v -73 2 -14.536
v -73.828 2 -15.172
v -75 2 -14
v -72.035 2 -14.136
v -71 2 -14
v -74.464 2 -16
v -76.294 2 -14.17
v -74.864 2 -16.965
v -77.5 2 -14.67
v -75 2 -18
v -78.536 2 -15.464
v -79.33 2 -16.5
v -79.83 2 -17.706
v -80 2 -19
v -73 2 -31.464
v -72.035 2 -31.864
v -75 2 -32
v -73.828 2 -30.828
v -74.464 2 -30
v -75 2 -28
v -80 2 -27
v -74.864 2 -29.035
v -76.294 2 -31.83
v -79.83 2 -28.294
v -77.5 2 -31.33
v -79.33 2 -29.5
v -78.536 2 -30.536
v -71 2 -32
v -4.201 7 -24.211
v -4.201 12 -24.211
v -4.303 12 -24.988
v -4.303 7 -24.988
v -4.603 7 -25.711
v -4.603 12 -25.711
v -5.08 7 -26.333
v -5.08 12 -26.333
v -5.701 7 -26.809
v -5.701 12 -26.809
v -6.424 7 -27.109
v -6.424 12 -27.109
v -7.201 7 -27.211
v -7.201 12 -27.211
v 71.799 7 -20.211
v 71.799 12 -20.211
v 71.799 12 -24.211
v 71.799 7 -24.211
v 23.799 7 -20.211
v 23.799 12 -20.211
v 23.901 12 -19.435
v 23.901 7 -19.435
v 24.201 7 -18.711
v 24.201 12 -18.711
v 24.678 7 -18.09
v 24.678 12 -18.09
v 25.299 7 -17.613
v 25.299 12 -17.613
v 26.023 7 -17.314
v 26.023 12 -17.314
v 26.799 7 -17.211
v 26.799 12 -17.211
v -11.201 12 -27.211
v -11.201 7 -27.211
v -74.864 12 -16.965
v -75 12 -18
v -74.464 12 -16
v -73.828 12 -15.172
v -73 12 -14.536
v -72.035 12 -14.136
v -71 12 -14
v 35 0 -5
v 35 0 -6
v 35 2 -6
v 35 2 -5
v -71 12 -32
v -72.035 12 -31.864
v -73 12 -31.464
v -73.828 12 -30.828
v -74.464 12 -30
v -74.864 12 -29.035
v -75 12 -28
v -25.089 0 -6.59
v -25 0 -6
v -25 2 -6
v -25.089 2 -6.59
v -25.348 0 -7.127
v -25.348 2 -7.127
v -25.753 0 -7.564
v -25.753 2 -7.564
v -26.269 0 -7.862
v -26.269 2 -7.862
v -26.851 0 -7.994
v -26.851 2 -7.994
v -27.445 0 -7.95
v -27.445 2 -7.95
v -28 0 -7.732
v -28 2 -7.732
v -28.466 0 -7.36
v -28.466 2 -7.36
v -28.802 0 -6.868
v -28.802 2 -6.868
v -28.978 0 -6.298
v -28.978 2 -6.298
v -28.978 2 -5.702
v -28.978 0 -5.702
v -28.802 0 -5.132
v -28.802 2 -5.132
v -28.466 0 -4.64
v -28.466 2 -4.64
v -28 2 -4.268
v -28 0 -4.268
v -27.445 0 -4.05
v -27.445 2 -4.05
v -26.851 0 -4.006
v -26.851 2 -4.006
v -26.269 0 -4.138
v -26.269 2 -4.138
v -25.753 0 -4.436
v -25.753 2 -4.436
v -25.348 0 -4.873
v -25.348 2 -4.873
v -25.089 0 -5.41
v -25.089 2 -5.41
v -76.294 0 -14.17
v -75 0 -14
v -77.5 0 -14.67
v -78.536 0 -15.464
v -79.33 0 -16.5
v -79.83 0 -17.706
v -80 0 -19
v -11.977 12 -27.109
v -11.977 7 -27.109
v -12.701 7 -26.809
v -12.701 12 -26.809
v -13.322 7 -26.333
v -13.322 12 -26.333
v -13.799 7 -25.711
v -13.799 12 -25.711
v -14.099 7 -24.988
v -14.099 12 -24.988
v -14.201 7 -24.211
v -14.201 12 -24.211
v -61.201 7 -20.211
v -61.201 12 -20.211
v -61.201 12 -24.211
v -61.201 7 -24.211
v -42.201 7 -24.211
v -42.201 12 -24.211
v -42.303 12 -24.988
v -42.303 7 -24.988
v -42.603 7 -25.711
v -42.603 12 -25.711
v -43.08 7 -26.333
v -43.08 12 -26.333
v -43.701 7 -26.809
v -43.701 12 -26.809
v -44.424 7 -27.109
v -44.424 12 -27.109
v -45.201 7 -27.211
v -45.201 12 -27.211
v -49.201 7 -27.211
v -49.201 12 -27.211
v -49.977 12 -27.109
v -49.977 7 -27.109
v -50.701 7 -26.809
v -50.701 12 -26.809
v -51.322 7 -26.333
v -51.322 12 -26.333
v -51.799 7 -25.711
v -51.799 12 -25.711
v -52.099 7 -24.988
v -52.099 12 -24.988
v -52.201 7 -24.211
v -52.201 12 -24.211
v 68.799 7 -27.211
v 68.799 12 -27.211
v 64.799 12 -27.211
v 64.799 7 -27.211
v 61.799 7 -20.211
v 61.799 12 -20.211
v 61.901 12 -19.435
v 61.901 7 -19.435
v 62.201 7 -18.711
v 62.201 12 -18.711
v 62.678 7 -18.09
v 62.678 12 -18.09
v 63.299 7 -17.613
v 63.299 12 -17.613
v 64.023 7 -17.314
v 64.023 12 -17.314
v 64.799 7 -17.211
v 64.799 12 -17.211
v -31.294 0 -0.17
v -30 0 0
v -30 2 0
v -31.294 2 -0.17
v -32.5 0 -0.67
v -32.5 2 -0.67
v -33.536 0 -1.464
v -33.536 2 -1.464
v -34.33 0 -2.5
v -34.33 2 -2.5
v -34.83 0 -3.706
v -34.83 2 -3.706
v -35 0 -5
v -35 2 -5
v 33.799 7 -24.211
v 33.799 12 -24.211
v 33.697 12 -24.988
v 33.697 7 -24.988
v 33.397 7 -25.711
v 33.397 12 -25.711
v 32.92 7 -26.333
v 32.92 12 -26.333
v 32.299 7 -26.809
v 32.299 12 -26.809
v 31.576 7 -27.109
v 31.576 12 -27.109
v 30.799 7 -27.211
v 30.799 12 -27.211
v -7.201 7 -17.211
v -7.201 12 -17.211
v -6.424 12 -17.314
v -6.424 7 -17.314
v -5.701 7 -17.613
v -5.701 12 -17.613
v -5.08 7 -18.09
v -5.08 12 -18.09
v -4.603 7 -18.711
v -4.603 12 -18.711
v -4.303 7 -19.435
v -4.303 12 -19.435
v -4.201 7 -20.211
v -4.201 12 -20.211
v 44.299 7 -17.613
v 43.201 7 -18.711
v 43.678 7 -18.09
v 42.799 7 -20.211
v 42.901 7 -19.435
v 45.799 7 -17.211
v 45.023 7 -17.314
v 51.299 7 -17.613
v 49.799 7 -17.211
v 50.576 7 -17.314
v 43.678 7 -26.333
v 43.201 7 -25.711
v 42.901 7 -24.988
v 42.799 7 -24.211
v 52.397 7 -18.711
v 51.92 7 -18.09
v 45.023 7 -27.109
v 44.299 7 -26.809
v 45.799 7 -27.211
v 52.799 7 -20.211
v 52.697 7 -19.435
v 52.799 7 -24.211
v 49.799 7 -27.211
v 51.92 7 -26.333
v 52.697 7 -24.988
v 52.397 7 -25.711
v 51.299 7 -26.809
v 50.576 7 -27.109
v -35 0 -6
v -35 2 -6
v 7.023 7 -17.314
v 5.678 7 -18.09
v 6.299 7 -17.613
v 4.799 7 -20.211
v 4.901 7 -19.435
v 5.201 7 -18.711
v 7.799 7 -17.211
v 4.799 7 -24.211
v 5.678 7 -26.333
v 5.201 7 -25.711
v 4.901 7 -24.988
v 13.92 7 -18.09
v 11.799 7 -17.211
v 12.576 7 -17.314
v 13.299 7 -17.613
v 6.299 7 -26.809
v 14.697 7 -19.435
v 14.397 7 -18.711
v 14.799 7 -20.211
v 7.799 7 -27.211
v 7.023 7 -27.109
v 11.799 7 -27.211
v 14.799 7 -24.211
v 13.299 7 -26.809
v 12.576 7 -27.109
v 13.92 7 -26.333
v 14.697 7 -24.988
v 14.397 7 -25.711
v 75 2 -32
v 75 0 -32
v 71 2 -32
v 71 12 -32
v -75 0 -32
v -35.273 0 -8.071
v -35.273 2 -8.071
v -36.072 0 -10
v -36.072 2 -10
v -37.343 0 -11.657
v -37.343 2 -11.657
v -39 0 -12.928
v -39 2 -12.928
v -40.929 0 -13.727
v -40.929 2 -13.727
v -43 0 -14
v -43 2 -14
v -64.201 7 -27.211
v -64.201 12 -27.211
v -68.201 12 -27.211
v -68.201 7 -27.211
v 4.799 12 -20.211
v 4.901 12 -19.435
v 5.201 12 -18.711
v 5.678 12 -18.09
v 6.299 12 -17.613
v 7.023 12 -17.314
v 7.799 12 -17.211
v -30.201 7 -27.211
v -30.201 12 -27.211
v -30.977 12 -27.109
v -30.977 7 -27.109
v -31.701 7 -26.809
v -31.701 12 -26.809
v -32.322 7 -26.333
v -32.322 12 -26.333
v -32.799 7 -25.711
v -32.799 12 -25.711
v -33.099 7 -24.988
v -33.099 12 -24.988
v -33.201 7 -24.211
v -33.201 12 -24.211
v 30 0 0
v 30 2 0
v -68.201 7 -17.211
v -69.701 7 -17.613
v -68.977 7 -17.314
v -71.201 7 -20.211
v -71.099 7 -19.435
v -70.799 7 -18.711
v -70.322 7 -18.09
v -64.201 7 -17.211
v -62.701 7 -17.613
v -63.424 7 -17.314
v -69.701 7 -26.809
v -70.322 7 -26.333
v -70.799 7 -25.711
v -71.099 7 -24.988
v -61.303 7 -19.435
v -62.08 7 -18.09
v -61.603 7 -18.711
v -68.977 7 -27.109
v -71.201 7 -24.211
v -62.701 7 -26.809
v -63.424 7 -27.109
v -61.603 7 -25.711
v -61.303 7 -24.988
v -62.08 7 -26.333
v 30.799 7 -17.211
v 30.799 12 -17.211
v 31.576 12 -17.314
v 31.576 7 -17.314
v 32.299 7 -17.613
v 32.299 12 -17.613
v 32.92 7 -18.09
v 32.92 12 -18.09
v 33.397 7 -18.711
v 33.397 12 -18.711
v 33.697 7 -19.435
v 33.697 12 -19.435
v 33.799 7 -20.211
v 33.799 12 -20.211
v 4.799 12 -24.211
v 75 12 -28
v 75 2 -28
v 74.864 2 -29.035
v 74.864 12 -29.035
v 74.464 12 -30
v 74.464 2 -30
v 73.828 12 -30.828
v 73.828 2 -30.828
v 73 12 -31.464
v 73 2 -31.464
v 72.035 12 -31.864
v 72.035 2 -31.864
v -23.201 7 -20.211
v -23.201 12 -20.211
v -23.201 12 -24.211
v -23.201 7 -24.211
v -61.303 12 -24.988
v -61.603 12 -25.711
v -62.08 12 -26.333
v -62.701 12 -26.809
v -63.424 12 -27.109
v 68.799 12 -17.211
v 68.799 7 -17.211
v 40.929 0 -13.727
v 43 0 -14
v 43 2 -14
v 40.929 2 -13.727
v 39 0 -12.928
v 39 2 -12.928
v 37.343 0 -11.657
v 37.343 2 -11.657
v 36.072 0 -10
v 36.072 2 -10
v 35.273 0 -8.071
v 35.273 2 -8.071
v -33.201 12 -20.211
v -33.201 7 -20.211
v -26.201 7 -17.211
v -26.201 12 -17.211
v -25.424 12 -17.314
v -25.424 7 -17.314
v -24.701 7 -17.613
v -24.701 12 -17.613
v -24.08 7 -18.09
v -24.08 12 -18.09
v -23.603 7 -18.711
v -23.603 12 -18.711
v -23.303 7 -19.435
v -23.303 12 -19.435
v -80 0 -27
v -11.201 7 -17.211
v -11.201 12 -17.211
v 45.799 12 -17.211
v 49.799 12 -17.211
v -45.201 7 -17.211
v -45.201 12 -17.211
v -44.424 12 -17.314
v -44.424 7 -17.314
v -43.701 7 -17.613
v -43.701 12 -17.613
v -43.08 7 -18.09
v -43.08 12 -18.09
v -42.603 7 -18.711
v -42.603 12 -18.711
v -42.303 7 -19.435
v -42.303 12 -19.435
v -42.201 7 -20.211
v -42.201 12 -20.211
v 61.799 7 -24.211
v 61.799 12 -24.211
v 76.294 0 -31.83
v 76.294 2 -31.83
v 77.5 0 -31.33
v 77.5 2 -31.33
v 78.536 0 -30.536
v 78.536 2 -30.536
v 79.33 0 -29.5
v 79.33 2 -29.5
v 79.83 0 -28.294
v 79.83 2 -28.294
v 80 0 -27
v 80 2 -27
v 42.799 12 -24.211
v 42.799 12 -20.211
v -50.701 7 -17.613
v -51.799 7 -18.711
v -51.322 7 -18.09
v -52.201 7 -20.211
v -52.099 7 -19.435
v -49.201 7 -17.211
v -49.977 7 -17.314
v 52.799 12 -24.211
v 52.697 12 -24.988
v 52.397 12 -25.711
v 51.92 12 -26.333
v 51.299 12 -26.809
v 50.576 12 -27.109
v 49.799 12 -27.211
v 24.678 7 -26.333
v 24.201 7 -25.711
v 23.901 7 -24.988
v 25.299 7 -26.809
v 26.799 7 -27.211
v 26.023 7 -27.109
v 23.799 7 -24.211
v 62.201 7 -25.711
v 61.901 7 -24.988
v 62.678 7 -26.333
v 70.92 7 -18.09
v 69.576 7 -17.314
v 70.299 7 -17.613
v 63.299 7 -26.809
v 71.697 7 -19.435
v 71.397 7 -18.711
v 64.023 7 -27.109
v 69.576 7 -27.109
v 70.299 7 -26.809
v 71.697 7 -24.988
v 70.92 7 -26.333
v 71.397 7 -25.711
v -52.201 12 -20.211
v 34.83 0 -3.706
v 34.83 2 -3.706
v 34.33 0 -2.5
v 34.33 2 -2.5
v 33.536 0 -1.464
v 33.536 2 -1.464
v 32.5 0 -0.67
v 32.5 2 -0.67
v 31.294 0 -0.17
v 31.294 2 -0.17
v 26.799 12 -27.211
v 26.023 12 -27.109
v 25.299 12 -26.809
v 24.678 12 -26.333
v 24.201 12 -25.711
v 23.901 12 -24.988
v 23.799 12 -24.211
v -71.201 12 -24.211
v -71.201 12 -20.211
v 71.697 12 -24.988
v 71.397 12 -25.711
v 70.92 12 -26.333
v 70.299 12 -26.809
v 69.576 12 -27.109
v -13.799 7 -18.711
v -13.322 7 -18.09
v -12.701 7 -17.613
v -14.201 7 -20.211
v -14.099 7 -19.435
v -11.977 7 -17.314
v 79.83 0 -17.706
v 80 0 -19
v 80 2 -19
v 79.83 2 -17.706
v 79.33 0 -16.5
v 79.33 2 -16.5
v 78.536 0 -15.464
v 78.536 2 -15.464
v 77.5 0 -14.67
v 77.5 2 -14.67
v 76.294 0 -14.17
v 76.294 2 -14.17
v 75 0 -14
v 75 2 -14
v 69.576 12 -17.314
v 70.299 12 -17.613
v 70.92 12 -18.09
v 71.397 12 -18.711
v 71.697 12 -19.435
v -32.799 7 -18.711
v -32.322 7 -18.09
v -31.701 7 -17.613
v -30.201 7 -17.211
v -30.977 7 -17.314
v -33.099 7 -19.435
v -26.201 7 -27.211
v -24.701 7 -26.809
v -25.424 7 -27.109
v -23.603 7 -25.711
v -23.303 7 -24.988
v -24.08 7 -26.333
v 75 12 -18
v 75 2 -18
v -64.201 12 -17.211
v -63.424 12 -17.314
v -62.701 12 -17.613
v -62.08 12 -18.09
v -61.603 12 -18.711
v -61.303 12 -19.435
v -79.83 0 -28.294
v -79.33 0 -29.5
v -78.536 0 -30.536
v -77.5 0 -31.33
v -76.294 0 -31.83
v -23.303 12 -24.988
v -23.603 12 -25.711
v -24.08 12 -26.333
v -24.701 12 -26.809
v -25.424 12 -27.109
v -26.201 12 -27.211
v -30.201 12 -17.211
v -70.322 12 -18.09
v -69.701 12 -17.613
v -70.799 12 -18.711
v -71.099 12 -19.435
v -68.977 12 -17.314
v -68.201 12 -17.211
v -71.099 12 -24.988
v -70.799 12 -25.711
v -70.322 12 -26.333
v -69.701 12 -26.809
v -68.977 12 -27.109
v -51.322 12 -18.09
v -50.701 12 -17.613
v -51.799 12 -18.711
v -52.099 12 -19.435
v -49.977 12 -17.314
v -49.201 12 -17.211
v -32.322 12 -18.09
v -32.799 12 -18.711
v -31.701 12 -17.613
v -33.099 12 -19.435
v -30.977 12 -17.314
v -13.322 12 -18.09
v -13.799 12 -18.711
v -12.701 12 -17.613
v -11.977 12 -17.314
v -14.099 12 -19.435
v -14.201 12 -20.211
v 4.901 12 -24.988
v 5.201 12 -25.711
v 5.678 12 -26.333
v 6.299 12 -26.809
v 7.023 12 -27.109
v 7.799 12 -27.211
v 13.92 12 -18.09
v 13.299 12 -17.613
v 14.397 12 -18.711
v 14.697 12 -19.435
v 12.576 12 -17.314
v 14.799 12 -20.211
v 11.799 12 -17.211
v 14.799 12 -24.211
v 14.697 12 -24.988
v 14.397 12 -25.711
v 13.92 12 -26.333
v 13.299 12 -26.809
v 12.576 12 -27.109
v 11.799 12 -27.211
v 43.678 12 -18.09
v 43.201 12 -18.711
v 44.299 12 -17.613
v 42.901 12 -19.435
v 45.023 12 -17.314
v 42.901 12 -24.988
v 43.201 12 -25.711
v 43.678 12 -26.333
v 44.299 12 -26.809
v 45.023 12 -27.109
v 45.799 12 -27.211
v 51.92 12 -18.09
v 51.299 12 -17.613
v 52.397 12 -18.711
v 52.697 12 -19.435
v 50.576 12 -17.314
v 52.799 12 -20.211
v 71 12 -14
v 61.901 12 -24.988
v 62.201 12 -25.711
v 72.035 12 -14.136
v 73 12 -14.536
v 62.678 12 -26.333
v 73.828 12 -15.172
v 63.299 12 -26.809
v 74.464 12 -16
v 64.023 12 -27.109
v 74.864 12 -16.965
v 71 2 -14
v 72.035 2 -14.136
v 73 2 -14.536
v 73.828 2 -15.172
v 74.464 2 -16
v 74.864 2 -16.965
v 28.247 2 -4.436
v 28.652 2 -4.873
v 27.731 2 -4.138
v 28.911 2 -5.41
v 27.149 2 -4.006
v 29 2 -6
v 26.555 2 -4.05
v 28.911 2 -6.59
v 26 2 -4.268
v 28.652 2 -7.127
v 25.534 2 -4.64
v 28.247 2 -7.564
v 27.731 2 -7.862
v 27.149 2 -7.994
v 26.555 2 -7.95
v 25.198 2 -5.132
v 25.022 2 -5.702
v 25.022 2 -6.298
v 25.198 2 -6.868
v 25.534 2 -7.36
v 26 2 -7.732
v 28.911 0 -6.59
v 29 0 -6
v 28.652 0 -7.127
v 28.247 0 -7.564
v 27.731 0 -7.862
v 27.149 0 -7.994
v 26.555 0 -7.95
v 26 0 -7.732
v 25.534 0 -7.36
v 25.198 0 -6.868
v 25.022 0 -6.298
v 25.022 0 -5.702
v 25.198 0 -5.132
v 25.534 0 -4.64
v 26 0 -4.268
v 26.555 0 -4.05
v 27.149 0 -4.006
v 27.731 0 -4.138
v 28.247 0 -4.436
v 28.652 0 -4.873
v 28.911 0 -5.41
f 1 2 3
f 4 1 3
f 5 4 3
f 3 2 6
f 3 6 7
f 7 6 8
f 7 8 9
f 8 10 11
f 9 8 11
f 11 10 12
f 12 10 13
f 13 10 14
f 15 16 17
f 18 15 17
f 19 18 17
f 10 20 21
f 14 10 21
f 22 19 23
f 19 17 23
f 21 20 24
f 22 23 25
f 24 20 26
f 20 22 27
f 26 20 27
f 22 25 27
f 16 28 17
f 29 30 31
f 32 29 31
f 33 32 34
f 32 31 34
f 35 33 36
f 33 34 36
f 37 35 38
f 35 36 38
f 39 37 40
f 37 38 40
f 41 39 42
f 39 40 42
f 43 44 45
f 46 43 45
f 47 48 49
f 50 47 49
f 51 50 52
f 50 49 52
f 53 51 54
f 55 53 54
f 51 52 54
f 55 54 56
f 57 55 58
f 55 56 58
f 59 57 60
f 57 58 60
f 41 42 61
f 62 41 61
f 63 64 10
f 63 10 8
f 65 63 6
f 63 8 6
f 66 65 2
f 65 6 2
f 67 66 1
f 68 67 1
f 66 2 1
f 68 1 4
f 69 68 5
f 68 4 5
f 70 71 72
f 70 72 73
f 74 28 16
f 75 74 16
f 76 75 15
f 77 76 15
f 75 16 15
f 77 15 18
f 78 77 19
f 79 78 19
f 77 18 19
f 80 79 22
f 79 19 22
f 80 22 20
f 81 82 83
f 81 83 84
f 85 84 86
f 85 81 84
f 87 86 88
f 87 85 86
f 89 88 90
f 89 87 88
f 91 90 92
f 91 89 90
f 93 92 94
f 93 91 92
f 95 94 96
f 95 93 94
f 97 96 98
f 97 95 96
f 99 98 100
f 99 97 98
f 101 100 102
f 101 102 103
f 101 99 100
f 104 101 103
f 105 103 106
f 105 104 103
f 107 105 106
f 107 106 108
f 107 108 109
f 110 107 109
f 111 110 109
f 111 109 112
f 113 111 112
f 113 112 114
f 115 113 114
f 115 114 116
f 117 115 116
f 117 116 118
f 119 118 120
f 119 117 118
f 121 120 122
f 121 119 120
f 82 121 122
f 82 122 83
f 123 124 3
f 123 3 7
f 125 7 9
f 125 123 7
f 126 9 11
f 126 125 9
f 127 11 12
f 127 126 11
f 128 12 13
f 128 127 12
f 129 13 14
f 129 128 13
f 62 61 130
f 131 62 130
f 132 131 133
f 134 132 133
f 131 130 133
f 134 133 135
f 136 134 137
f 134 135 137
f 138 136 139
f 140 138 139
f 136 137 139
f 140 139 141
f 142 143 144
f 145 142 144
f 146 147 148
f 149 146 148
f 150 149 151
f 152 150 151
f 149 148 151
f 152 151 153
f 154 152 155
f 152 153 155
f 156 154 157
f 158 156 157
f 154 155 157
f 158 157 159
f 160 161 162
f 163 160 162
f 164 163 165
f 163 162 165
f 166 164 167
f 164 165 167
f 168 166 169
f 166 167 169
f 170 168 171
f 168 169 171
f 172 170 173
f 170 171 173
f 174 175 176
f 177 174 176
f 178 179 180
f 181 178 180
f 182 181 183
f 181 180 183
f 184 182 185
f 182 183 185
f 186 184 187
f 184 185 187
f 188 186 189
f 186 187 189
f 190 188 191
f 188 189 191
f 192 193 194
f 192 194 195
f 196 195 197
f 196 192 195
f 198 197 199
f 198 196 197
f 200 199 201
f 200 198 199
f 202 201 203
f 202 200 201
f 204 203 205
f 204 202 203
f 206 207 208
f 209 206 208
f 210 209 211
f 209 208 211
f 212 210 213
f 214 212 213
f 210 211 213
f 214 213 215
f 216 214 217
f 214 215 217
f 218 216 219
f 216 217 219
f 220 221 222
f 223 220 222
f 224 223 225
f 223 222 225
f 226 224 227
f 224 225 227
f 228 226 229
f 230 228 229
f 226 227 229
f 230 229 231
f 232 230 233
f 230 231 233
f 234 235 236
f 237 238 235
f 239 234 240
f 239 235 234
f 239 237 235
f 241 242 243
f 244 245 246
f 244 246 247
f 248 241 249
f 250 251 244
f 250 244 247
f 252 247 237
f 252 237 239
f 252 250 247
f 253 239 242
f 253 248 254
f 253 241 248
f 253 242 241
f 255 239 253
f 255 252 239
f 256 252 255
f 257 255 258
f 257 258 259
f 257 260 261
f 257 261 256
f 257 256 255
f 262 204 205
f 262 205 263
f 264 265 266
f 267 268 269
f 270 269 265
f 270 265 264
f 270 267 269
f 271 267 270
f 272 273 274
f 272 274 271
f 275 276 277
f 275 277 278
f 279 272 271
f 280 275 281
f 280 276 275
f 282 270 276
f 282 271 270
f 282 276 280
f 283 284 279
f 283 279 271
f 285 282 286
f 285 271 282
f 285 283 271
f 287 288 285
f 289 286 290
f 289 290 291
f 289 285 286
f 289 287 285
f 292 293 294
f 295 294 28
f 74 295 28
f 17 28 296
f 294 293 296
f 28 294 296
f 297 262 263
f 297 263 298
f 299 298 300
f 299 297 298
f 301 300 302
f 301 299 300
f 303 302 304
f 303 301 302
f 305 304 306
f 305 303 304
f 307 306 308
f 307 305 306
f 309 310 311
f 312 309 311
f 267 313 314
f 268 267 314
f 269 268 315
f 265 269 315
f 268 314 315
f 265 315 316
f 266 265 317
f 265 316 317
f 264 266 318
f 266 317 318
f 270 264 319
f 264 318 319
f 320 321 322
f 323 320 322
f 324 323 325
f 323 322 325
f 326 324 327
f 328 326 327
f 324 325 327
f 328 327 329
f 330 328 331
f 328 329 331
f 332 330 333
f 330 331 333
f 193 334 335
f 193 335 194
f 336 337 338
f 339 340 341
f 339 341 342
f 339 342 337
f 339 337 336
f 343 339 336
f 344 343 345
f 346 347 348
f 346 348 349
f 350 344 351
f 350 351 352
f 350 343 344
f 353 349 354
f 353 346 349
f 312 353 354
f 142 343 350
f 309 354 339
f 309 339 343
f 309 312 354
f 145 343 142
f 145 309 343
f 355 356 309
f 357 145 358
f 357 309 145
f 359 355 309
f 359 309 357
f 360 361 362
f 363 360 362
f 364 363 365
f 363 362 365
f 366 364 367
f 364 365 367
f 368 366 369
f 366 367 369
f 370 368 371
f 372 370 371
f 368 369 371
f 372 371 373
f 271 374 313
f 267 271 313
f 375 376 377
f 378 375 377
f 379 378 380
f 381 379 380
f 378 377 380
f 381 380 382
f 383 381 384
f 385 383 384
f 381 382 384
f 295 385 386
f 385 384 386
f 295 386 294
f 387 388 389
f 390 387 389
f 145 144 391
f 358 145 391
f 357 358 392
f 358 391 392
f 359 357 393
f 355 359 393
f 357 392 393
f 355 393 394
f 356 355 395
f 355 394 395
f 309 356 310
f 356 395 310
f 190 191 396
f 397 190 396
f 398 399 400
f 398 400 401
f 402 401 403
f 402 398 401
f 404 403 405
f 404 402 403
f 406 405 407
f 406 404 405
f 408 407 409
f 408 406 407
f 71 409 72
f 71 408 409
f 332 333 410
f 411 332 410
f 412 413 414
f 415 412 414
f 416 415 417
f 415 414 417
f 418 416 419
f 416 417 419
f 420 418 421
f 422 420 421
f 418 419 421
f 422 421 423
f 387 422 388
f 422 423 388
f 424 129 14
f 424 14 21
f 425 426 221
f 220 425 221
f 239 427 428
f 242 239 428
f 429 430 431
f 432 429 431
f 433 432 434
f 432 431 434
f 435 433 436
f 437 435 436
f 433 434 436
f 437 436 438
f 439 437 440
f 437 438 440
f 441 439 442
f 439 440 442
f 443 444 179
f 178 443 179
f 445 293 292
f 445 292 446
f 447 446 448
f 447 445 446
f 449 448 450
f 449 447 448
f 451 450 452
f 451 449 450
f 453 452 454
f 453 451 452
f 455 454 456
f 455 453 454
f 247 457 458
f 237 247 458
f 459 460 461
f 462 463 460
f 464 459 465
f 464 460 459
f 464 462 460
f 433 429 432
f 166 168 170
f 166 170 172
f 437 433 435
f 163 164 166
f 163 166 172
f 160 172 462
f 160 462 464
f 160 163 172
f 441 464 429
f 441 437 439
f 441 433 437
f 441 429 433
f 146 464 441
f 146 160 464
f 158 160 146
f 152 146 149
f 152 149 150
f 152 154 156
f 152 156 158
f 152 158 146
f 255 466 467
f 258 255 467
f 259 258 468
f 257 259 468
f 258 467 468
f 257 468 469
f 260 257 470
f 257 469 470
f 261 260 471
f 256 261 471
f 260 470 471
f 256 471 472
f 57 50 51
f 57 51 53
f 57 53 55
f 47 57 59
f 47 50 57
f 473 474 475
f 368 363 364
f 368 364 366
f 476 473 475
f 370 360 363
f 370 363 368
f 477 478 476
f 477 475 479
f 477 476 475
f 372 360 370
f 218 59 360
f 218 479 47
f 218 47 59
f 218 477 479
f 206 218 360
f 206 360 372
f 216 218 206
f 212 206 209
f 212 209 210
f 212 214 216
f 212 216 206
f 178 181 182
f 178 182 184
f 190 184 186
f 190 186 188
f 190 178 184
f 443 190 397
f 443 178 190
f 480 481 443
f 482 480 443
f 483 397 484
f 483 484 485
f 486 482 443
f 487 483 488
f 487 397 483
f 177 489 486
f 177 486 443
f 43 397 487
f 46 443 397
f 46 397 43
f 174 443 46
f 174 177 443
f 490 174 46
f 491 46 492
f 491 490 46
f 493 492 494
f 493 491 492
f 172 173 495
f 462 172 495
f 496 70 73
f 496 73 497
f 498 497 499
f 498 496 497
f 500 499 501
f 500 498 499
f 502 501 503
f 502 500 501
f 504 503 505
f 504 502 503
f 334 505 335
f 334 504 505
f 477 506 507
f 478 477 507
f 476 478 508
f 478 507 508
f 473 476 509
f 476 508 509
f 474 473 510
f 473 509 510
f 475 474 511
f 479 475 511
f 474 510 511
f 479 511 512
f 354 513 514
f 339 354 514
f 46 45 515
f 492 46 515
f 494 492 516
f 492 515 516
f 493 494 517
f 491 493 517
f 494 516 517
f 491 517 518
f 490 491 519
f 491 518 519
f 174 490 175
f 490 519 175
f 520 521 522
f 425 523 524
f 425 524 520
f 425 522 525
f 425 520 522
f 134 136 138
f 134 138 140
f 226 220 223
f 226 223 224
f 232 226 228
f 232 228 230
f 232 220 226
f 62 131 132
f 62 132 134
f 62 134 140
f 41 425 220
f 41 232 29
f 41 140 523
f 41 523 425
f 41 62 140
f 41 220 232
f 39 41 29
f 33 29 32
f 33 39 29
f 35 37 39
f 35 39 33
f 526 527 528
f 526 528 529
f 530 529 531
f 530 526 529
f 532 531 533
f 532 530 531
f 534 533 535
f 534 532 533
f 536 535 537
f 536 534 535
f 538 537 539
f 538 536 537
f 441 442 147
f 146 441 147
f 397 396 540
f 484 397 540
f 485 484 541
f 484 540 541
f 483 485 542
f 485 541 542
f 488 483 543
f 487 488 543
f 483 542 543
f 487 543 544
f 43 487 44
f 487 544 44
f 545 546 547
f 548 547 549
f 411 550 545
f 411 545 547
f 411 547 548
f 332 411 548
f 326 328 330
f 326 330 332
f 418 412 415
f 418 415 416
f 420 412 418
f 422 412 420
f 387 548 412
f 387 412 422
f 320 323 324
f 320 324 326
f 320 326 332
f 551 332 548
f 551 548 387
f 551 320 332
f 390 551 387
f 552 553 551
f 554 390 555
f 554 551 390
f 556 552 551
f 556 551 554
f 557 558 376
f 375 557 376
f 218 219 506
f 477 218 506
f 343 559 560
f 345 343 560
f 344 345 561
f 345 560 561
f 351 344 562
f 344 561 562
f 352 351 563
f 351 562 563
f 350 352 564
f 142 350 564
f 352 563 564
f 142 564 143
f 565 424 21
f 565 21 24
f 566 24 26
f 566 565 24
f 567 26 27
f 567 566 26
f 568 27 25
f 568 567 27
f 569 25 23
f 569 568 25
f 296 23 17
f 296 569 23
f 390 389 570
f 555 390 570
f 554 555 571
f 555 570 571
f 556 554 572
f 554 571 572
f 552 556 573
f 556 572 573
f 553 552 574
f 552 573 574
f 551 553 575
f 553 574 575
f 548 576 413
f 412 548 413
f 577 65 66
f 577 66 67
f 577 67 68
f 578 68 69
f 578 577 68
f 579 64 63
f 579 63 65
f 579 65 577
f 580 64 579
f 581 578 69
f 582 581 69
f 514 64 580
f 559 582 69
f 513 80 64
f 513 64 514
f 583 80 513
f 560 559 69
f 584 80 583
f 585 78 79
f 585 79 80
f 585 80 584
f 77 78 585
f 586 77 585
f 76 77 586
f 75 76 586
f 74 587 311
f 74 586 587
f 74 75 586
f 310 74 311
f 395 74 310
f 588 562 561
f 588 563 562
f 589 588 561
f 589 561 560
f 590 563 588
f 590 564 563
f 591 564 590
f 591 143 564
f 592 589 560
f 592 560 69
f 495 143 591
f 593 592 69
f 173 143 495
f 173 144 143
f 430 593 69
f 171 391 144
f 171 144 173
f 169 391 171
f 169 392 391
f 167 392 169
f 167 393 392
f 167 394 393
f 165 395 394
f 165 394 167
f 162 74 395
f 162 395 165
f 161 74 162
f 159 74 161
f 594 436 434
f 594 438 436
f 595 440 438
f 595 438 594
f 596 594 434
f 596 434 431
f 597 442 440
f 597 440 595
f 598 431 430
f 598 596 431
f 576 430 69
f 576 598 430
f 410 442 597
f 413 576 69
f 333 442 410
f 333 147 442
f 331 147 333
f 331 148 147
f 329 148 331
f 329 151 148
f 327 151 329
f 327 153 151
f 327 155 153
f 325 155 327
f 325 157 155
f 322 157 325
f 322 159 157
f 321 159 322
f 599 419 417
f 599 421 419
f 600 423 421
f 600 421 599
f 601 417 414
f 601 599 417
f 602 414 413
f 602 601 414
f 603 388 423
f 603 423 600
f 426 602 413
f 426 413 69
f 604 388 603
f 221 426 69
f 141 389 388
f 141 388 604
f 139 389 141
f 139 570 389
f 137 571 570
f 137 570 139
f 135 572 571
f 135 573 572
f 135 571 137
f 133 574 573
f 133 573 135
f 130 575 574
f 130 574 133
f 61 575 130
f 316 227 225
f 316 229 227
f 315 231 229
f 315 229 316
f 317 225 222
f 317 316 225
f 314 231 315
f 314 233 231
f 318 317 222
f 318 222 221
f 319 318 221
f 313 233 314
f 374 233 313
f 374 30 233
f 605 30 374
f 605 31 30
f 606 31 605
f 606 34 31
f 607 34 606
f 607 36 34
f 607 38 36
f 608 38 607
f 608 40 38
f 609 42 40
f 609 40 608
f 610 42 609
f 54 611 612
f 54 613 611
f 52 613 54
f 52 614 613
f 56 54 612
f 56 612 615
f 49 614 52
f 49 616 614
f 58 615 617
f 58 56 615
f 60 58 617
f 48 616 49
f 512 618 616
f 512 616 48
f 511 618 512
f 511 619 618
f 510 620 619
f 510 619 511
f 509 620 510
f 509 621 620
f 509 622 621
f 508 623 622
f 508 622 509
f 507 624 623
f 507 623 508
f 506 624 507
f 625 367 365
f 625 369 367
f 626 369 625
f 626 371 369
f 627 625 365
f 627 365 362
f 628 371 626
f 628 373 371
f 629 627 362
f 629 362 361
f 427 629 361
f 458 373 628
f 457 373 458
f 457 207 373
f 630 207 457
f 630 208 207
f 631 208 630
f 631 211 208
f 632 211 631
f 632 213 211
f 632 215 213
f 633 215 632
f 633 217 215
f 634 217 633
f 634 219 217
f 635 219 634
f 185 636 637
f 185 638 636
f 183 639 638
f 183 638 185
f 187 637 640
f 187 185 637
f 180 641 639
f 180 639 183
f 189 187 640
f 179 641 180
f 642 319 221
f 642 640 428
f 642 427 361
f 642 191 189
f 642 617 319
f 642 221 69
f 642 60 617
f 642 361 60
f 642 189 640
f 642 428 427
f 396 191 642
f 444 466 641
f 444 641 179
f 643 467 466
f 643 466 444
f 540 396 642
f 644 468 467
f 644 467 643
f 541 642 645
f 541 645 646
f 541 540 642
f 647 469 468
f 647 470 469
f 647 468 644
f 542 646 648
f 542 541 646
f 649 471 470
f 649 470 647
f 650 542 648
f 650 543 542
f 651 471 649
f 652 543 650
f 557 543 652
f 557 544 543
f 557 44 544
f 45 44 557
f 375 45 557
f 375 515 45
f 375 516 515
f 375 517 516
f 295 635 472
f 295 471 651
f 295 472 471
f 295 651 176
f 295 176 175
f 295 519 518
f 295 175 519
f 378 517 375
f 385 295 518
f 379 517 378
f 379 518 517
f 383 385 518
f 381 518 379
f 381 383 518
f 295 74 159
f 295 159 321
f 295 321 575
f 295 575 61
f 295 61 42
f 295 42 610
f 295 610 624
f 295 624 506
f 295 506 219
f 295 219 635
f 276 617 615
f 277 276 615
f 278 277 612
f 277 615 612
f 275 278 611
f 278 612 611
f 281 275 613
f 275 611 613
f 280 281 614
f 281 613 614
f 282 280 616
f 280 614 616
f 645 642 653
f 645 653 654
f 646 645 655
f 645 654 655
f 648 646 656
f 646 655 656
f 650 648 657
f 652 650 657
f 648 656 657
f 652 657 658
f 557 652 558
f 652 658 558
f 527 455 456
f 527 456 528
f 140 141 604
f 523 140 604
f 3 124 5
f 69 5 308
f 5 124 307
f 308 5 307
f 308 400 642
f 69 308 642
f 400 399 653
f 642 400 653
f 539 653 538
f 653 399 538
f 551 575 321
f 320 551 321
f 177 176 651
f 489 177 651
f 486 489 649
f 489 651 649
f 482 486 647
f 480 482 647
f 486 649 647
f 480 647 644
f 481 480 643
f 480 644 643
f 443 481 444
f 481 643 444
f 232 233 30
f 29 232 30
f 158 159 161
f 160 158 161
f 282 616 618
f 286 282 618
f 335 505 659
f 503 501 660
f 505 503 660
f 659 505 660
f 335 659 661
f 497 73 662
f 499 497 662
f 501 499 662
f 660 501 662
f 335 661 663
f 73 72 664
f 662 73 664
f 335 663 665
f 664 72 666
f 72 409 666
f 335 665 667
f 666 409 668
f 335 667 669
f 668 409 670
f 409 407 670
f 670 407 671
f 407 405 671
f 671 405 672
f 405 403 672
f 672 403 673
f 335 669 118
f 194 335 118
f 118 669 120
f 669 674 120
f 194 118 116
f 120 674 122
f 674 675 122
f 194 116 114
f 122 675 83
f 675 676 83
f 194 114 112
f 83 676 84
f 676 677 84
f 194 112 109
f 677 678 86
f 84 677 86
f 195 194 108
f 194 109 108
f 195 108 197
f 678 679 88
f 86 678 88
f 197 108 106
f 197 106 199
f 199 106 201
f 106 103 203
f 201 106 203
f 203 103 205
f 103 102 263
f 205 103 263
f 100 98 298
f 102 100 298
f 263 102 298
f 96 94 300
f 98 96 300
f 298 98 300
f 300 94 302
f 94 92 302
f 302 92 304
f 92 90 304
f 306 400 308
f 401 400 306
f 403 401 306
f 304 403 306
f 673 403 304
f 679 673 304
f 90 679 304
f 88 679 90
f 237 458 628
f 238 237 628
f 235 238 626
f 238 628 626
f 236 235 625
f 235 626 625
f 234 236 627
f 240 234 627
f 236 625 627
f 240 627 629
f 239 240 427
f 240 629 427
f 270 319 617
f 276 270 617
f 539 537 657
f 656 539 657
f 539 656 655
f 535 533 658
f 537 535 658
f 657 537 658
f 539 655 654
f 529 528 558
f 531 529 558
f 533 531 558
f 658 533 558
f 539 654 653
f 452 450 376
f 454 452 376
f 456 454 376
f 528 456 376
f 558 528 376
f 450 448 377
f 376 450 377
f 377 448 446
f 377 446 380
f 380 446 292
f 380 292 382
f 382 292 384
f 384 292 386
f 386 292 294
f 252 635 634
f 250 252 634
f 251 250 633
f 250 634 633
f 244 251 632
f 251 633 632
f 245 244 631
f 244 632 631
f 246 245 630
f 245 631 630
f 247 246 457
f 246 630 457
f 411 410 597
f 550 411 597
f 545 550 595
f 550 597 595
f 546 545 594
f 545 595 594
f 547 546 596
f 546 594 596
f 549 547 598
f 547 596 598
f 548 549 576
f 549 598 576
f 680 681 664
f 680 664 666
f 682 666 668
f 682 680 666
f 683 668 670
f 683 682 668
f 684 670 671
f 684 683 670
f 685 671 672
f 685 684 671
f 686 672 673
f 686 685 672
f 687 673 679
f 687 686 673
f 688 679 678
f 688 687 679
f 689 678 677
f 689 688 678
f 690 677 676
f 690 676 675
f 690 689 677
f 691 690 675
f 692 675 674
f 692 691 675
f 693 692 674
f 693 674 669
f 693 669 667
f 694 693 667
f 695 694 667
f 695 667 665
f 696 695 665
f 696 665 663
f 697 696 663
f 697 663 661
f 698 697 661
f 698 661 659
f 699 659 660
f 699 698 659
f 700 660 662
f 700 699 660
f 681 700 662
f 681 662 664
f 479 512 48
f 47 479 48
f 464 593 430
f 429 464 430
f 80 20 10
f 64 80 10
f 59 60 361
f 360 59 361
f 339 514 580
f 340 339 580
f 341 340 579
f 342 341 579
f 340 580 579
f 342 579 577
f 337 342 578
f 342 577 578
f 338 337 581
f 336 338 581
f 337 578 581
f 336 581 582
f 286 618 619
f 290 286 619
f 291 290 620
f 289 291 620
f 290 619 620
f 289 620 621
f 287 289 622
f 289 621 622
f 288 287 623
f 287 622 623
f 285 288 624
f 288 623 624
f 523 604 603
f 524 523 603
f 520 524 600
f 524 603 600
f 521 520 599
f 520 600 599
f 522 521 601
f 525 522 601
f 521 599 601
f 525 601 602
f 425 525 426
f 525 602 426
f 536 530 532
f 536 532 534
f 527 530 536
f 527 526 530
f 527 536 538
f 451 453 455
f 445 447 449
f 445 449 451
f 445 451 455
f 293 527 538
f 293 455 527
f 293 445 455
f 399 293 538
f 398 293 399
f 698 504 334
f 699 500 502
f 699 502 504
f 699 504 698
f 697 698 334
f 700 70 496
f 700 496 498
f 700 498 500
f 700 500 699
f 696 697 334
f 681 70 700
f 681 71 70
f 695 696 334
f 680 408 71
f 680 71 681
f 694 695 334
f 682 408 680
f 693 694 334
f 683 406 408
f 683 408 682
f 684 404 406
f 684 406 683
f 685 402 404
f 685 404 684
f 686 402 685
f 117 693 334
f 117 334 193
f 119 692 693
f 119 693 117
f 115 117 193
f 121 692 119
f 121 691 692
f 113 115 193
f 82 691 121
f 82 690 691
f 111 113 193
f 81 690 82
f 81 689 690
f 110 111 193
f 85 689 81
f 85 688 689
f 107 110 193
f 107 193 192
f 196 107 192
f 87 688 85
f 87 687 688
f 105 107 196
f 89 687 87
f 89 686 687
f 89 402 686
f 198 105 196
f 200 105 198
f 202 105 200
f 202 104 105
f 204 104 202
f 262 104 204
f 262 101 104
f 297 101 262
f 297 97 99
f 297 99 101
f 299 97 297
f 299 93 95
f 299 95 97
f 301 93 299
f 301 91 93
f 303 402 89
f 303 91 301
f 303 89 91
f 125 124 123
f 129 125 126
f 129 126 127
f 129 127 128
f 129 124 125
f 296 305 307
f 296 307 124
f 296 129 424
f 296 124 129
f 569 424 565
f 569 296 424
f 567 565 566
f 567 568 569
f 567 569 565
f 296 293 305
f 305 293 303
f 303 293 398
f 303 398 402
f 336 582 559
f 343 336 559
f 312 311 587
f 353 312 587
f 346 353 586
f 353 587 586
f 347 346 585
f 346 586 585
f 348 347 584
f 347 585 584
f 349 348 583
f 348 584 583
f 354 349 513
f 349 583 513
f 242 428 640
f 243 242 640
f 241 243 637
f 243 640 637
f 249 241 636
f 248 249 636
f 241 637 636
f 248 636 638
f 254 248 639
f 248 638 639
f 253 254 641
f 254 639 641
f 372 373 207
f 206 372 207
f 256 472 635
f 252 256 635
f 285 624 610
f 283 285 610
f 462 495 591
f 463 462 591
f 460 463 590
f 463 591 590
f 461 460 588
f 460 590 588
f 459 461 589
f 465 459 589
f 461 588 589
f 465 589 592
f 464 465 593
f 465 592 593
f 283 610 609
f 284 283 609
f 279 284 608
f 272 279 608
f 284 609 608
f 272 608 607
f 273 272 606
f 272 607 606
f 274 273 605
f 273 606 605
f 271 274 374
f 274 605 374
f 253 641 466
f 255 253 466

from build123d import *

# Parameters (mm, degrees)
SKETCH_1_R          = 2
EXTRUDE_1_DEPTH     = 2
EXTRUDE_2_DEPTH     = 10
CUT_EXTRUDE_1_DEPTH = 5


with BuildPart() as part:
    # 草图1 → 凸台-拉伸1 (new body)
    with BuildSketch(Plane(origin=(0, 0, 0), x_dir=(1, 0, 0), z_dir=(0, 1, 0))):
        with BuildLine():
            Line((-75, 32), (75, 32))
            ThreePointArc((75, 32), (78.535533906, 30.535533906), (80, 27))
            Line((80, 27), (80, 19))
            ThreePointArc((80, 19), (78.535533906, 15.464466094), (75, 14))
            Line((75, 14), (43, 14))
            ThreePointArc((43, 14), (37.343145751, 11.656854249), (35, 6))
            Line((35, 6), (35, 5))
            ThreePointArc((35, 5), (33.535533906, 1.464466094), (30, 0))
            Line((30, 0), (-30, 0))
            ThreePointArc((-30, 0), (-33.535533906, 1.464466094), (-35, 5))
            Line((-35, 5), (-35, 6))
            ThreePointArc((-35, 6), (-37.343145751, 11.656854249), (-43, 14))
            Line((-43, 14), (-75, 14))
            ThreePointArc((-75, 14), (-78.535533906, 15.464466094), (-80, 19))
            Line((-80, 19), (-80, 27))
            ThreePointArc((-80, 27), (-78.535533906, 30.535533906), (-75, 32))
        make_face()
        with Locations((-27, 6)):
            Circle(SKETCH_1_R, mode=Mode.SUBTRACT)
        with Locations((27, 6)):
            Circle(SKETCH_1_R, mode=Mode.SUBTRACT)
    extrude(amount=EXTRUDE_1_DEPTH)

    # 草图2 → 凸台-拉伸2 (add)
    with BuildSketch(Plane(origin=(0, 2, 0), x_dir=(1, 0, 0), z_dir=(0, 1, 0))):
        with BuildLine():
            Line((-71, 14), (71, 14))
            ThreePointArc((71, 14), (73.828427125, 15.171572875), (75, 18))
            Line((75, 18), (75, 28))
            ThreePointArc((75, 28), (73.828427125, 30.828427125), (71, 32))
            Line((71, 32), (-71, 32))
            ThreePointArc((-71, 32), (-73.828427125, 30.828427125), (-75, 28))
            Line((-75, 28), (-75, 18))
            ThreePointArc((-75, 18), (-73.828427125, 15.171572875), (-71, 14))
        make_face()
    extrude(amount=EXTRUDE_2_DEPTH)

    # 草图3 → 切除-拉伸1 (cut)
    with BuildSketch(Plane(origin=(0, 12, 0), x_dir=(1, 0, 0), z_dir=(0, 1, 0))):
        with BuildLine():
            Line((-49.200934141, 17.21130212), (-45.200934141, 17.21130212))
            ThreePointArc((-45.200934141, 17.21130212), (-43.079613798, 18.089981777), (-42.200934141, 20.21130212))
            Line((-42.200934141, 20.21130212), (-42.200934141, 24.21130212))
            ThreePointArc((-42.200934141, 24.21130212), (-43.079613798, 26.332622464), (-45.200934141, 27.21130212))
            Line((-45.200934141, 27.21130212), (-49.200934141, 27.21130212))
            ThreePointArc((-49.200934141, 27.21130212), (-51.322254485, 26.332622464), (-52.200934141, 24.21130212))
            Line((-52.200934141, 24.21130212), (-52.200934141, 20.21130212))
            ThreePointArc((-52.200934141, 20.21130212), (-51.322254485, 18.089981777), (-49.200934141, 17.21130212))
        make_face()
        with BuildLine():
            Line((-68.200934141, 17.21130212), (-64.200934141, 17.21130212))
            ThreePointArc((-64.200934141, 17.21130212), (-62.079613798, 18.089981777), (-61.200934141, 20.21130212))
            Line((-61.200934141, 20.21130212), (-61.200934141, 24.21130212))
            ThreePointArc((-61.200934141, 24.21130212), (-62.079613798, 26.332622464), (-64.200934141, 27.21130212))
            Line((-64.200934141, 27.21130212), (-68.200934141, 27.21130212))
            ThreePointArc((-68.200934141, 27.21130212), (-70.322254485, 26.332622464), (-71.200934141, 24.21130212))
            Line((-71.200934141, 24.21130212), (-71.200934141, 20.21130212))
            ThreePointArc((-71.200934141, 20.21130212), (-70.322254485, 18.089981777), (-68.200934141, 17.21130212))
        make_face()
        with BuildLine():
            Line((-30.200934141, 17.21130212), (-26.200934141, 17.21130212))
            ThreePointArc((-26.200934141, 17.21130212), (-24.079613798, 18.089981777), (-23.200934141, 20.21130212))
            Line((-23.200934141, 20.21130212), (-23.200934141, 24.21130212))
            ThreePointArc((-23.200934141, 24.21130212), (-24.079613798, 26.332622464), (-26.200934141, 27.21130212))
            Line((-26.200934141, 27.21130212), (-30.200934141, 27.21130212))
            ThreePointArc((-30.200934141, 27.21130212), (-32.322254485, 26.332622464), (-33.200934141, 24.21130212))
            Line((-33.200934141, 24.21130212), (-33.200934141, 20.21130212))
            ThreePointArc((-33.200934141, 20.21130212), (-32.322254485, 18.089981777), (-30.200934141, 17.21130212))
        make_face()
        with BuildLine():
            Line((-11.200934141, 17.21130212), (-7.200934141, 17.21130212))
            ThreePointArc((-7.200934141, 17.21130212), (-5.079613798, 18.089981777), (-4.200934141, 20.21130212))
            Line((-4.200934141, 20.21130212), (-4.200934141, 24.21130212))
            ThreePointArc((-4.200934141, 24.21130212), (-5.079613798, 26.332622464), (-7.200934141, 27.21130212))
            Line((-7.200934141, 27.21130212), (-11.200934141, 27.21130212))
            ThreePointArc((-11.200934141, 27.21130212), (-13.322254485, 26.332622464), (-14.200934141, 24.21130212))
            Line((-14.200934141, 24.21130212), (-14.200934141, 20.21130212))
            ThreePointArc((-14.200934141, 20.21130212), (-13.322254485, 18.089981777), (-11.200934141, 17.21130212))
        make_face()
        with BuildLine():
            Line((7.799065859, 17.21130212), (11.799065859, 17.21130212))
            ThreePointArc((11.799065859, 17.21130212), (13.920386202, 18.089981777), (14.799065859, 20.21130212))
            Line((14.799065859, 20.21130212), (14.799065859, 24.21130212))
            ThreePointArc((14.799065859, 24.21130212), (13.920386202, 26.332622464), (11.799065859, 27.21130212))
            Line((11.799065859, 27.21130212), (7.799065859, 27.21130212))
            ThreePointArc((7.799065859, 27.21130212), (5.677745515, 26.332622464), (4.799065859, 24.21130212))
            Line((4.799065859, 24.21130212), (4.799065859, 20.21130212))
            ThreePointArc((4.799065859, 20.21130212), (5.677745515, 18.089981777), (7.799065859, 17.21130212))
        make_face()
        with BuildLine():
            Line((26.799065859, 17.21130212), (30.799065859, 17.21130212))
            ThreePointArc((30.799065859, 17.21130212), (32.920386202, 18.089981777), (33.799065859, 20.21130212))
            Line((33.799065859, 20.21130212), (33.799065859, 24.21130212))
            ThreePointArc((33.799065859, 24.21130212), (32.920386202, 26.332622464), (30.799065859, 27.21130212))
            Line((30.799065859, 27.21130212), (26.799065859, 27.21130212))
            ThreePointArc((26.799065859, 27.21130212), (24.677745515, 26.332622464), (23.799065859, 24.21130212))
            Line((23.799065859, 24.21130212), (23.799065859, 20.21130212))
            ThreePointArc((23.799065859, 20.21130212), (24.677745515, 18.089981777), (26.799065859, 17.21130212))
        make_face()
        with BuildLine():
            Line((45.799065859, 17.21130212), (49.799065859, 17.21130212))
            ThreePointArc((49.799065859, 17.21130212), (51.920386202, 18.089981777), (52.799065859, 20.21130212))
            Line((52.799065859, 20.21130212), (52.799065859, 24.21130212))
            ThreePointArc((52.799065859, 24.21130212), (51.920386202, 26.332622464), (49.799065859, 27.21130212))
            Line((49.799065859, 27.21130212), (45.799065859, 27.21130212))
            ThreePointArc((45.799065859, 27.21130212), (43.677745515, 26.332622464), (42.799065859, 24.21130212))
            Line((42.799065859, 24.21130212), (42.799065859, 20.21130212))
            ThreePointArc((42.799065859, 20.21130212), (43.677745515, 18.089981777), (45.799065859, 17.21130212))
        make_face()
        with BuildLine():
            Line((64.799065859, 17.21130212), (68.799065859, 17.21130212))
            ThreePointArc((68.799065859, 17.21130212), (70.920386202, 18.089981777), (71.799065859, 20.21130212))
            Line((71.799065859, 20.21130212), (71.799065859, 24.21130212))
            ThreePointArc((71.799065859, 24.21130212), (70.920386202, 26.332622464), (68.799065859, 27.21130212))
            Line((68.799065859, 27.21130212), (64.799065859, 27.21130212))
            ThreePointArc((64.799065859, 27.21130212), (62.677745515, 26.332622464), (61.799065859, 24.21130212))
            Line((61.799065859, 24.21130212), (61.799065859, 20.21130212))
            ThreePointArc((61.799065859, 20.21130212), (62.677745515, 18.089981777), (64.799065859, 17.21130212))
        make_face()
    extrude(amount=-CUT_EXTRUDE_1_DEPTH, mode=Mode.SUBTRACT)


solid = part.part
